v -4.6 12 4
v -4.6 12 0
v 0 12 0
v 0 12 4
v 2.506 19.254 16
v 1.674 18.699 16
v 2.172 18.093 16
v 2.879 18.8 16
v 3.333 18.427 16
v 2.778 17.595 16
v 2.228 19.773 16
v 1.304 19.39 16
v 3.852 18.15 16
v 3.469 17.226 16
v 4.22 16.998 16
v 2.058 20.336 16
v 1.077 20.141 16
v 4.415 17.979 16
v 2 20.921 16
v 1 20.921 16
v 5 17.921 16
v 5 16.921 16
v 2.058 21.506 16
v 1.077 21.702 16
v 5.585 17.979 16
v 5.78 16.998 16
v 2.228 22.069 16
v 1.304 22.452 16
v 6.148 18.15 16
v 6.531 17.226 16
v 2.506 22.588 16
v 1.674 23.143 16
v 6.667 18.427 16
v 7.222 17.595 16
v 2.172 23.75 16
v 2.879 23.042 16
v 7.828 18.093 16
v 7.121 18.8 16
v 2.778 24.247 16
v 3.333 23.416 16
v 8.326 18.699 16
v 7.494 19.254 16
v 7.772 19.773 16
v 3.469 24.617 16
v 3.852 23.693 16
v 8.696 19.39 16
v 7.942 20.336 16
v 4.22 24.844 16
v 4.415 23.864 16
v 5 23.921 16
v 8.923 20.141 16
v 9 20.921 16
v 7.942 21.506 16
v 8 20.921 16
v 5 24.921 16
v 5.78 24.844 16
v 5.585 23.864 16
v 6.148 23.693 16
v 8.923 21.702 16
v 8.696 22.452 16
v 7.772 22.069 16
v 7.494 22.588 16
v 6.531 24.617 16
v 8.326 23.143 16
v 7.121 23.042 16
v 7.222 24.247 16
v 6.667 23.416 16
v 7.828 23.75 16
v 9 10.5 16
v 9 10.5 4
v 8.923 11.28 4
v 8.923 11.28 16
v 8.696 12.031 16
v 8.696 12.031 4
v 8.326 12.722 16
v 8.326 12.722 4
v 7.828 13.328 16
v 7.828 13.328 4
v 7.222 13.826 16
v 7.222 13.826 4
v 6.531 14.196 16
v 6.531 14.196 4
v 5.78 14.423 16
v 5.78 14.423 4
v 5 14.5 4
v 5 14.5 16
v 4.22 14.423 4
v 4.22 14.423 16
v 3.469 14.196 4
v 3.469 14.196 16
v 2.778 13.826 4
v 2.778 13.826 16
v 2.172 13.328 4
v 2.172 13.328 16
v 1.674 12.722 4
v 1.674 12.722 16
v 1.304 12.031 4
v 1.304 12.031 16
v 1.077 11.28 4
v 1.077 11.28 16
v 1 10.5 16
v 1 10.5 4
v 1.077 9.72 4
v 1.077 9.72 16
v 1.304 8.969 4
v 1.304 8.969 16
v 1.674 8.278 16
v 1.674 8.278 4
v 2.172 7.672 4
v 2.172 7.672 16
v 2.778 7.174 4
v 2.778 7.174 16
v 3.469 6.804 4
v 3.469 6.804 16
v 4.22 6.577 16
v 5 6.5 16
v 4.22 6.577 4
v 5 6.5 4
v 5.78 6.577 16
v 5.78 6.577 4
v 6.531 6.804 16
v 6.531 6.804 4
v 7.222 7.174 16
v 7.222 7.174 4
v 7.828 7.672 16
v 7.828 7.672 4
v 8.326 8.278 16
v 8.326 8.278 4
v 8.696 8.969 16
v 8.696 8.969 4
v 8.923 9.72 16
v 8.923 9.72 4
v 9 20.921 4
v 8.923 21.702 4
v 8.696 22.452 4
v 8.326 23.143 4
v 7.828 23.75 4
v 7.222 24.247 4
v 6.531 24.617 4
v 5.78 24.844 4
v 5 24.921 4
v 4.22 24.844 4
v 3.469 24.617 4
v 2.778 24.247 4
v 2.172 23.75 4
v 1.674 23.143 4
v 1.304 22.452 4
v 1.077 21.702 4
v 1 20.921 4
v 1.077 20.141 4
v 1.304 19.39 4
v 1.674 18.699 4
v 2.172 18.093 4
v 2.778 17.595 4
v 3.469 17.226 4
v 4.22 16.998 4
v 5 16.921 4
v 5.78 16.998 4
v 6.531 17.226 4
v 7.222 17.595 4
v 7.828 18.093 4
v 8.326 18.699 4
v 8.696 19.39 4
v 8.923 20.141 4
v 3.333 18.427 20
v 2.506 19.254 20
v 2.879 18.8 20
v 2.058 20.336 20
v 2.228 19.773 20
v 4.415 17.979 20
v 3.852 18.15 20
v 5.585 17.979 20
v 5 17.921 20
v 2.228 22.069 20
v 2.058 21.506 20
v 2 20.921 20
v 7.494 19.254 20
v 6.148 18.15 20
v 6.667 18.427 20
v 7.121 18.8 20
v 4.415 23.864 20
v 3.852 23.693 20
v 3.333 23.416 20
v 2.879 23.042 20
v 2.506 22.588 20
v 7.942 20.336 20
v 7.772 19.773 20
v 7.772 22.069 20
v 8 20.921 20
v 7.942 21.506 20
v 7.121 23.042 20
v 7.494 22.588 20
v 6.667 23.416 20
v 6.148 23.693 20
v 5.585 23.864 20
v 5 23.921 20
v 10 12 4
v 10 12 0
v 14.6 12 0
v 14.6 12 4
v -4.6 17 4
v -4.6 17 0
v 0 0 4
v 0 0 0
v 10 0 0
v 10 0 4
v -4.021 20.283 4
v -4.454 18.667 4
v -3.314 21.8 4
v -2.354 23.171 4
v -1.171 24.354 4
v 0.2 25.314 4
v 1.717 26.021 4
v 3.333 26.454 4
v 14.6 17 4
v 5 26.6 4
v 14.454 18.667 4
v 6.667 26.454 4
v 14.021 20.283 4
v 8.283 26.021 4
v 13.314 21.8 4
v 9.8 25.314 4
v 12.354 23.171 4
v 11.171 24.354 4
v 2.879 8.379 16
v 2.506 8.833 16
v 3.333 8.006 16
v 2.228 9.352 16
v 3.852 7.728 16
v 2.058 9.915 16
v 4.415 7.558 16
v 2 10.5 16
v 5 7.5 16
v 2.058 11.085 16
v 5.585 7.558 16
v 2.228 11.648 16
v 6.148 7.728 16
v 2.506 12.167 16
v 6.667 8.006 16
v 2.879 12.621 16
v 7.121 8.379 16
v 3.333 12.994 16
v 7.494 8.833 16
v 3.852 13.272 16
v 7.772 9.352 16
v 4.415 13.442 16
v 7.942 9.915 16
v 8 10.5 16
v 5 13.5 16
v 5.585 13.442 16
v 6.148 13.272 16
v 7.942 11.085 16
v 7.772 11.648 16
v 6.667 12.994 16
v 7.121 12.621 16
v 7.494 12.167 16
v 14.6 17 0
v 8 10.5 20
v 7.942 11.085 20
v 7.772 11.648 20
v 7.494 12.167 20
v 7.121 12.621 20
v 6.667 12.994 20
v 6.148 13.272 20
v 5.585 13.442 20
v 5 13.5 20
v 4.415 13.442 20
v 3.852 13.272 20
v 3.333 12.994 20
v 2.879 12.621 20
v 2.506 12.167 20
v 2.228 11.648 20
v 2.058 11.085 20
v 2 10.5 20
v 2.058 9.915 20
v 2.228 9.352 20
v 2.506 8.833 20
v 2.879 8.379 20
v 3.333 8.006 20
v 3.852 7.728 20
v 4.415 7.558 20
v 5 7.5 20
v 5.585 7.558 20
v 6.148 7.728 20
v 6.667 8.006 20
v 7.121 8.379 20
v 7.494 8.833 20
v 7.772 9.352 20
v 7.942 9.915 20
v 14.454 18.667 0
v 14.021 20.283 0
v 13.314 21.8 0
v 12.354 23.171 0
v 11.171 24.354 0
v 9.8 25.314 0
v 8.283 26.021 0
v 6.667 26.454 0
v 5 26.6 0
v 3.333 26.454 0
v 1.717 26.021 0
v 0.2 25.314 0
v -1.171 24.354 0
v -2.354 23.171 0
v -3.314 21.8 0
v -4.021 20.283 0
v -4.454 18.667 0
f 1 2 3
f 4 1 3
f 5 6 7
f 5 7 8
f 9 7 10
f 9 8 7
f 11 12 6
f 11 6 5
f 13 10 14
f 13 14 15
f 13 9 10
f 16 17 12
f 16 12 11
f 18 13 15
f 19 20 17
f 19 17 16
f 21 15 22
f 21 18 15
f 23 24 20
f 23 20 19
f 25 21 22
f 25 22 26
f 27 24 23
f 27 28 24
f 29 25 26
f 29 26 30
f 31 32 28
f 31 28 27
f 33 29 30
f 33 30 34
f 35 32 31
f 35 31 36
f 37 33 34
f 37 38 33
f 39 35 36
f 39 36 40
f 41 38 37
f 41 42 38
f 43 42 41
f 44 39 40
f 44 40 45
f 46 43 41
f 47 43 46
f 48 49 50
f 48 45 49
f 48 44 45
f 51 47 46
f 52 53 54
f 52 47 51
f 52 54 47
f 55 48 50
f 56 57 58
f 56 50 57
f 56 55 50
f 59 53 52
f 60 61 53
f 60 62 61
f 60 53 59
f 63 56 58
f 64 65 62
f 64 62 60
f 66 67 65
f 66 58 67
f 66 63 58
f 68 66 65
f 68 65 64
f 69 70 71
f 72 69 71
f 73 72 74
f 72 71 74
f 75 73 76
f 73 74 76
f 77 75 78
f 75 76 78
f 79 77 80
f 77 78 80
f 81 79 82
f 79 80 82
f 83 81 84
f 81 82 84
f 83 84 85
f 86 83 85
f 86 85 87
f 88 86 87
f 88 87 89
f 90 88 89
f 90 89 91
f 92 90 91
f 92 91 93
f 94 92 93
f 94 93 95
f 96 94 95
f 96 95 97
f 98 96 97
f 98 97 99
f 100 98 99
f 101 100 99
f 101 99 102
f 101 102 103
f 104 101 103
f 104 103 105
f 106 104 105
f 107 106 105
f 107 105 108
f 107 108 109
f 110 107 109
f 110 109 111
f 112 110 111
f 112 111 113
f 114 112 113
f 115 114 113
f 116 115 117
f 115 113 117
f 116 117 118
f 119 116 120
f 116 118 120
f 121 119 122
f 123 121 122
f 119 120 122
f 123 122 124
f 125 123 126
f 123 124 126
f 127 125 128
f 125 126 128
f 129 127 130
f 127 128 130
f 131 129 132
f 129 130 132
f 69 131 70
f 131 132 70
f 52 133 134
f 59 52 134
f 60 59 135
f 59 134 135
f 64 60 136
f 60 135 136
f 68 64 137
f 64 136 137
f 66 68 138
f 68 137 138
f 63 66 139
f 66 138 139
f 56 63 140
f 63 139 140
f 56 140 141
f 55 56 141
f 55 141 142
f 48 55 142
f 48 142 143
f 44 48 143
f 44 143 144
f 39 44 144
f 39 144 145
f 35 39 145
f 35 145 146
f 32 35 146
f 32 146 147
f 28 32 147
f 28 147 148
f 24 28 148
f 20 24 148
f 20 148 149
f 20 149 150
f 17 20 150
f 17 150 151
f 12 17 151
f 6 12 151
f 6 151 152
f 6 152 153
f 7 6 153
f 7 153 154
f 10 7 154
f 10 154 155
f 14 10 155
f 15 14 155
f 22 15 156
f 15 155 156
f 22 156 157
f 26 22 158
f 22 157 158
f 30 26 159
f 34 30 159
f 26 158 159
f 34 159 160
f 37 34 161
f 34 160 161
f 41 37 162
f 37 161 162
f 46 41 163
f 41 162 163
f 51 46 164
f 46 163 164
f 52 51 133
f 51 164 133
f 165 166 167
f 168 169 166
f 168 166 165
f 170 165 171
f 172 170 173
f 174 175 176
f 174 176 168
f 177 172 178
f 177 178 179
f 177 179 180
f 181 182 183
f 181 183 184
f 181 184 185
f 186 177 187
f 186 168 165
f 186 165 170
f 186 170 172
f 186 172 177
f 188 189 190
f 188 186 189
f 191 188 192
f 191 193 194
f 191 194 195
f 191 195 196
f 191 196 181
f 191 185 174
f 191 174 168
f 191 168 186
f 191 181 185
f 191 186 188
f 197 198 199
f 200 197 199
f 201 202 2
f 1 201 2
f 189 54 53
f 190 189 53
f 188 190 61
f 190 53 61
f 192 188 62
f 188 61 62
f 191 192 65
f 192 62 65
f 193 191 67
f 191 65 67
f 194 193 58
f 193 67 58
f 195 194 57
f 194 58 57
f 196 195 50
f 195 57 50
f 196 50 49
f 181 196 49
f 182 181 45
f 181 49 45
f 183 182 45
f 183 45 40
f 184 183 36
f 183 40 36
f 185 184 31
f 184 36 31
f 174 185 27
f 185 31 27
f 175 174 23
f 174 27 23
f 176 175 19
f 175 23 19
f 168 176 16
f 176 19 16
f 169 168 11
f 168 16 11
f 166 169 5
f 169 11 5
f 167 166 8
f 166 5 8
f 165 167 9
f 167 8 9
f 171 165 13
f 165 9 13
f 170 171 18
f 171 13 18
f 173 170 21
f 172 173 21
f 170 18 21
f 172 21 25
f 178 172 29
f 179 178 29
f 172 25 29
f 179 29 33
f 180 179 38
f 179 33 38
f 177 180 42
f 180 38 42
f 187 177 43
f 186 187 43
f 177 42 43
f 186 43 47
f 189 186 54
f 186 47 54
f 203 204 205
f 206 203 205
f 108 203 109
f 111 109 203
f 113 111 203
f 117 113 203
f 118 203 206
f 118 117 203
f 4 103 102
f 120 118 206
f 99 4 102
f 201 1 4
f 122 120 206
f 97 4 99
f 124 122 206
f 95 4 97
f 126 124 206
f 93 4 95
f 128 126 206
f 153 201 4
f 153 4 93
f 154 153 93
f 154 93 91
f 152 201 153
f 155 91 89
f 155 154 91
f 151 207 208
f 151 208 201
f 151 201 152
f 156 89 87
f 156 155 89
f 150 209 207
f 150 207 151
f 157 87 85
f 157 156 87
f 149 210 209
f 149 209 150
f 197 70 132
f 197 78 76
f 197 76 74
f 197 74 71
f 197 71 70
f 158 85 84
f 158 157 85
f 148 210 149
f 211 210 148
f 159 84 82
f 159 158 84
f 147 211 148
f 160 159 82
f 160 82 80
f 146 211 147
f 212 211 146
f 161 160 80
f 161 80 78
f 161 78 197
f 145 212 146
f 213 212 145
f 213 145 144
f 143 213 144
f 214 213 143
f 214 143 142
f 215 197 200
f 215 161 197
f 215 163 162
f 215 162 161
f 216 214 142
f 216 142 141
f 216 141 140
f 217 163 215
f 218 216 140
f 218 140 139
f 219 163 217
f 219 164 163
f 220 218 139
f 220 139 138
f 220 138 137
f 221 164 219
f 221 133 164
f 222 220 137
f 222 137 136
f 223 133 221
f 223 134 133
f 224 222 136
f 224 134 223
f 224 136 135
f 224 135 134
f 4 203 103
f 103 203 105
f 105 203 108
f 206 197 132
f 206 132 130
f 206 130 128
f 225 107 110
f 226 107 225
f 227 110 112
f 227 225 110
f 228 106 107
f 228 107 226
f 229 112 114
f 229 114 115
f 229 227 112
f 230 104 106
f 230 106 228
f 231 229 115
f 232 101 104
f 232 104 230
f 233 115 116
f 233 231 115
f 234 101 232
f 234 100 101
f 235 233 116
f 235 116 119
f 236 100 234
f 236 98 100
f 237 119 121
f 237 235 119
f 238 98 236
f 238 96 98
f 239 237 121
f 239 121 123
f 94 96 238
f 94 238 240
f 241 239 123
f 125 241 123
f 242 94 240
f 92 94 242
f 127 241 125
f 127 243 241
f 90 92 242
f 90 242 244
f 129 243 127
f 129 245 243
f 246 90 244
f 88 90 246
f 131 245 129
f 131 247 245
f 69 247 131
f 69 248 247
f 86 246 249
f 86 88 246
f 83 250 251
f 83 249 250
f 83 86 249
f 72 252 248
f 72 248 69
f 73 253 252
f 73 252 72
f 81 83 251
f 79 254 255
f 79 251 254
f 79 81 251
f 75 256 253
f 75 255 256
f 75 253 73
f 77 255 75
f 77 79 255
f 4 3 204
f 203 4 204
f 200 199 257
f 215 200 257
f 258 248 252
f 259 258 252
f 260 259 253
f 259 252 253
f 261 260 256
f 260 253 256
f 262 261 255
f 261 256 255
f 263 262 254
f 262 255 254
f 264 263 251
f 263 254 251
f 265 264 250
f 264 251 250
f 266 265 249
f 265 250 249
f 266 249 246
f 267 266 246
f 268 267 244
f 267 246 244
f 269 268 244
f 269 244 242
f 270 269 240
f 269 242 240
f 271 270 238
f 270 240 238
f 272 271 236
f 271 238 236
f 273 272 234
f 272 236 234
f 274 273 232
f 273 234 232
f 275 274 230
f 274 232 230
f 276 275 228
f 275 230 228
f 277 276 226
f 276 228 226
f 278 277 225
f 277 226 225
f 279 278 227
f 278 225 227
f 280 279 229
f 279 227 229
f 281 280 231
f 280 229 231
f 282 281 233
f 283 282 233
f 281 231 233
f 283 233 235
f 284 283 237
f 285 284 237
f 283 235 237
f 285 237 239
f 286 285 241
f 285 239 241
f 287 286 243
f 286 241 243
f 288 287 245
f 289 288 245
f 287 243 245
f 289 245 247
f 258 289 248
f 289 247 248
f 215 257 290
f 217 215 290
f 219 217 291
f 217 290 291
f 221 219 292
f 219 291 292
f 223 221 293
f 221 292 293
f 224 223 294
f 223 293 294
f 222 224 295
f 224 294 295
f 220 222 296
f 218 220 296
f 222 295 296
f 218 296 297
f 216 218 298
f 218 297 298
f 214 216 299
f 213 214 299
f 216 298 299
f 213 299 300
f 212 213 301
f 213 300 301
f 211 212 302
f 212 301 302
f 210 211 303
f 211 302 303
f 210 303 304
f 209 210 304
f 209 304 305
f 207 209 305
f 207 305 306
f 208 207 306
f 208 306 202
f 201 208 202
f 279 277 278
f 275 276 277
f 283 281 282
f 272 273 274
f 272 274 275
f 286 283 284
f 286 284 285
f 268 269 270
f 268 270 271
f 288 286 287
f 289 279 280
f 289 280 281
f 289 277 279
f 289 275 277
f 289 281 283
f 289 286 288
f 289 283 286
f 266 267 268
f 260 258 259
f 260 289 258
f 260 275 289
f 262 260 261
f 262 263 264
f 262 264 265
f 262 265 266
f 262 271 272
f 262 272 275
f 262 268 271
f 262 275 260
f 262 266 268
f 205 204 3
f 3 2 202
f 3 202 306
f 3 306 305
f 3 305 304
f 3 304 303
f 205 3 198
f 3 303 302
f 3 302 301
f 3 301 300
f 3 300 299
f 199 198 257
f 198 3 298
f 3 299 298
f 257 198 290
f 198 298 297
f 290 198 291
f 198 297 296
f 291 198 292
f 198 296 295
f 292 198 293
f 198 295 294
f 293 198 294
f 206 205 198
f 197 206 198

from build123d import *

# Parameters (mm, degrees)
BOSS_EXTRUDE1_DEPTH = 4
SKETCH2_W           = 2.5
SKETCH2_H           = 4
CUT_EXTRUDE1_DEPTH  = 4
SKETCH4_R           = 4
BOSS_EXTRUDE2_DEPTH = 16
SKETCH5_R           = 3
BOSS_EXTRUDE3_DEPTH = 4


with BuildPart() as part:
    # Sketch1 → Boss-Extrude1 (new body)
    with BuildSketch(Plane.XY):
        with BuildLine():
            Line((0, 0), (10, 0))
            Line((10, 0), (10, 4))
            Line((10, 4), (12.5, 4))
            Line((12.5, 4), (12.5, 8))
            Line((12.5, 8), (10, 8))
            Line((10, 8), (10, 12))
            Line((10, 12), (14.6, 12))
            Line((14.6, 12), (14.6, 17))
            ThreePointArc((14.6, 17), (5, 26.6), (-4.6, 17))
            Line((-4.6, 17), (-4.6, 12))
            Line((-4.6, 12), (0, 12))
            Line((0, 12), (0, 8))
            Line((0, 8), (-2.5, 8))
            Line((-2.5, 8), (-2.5, 4))
            Line((-2.5, 4), (0, 4))
            Line((0, 4), (0, 0))
        make_face()
    extrude(amount=BOSS_EXTRUDE1_DEPTH)

    # Sketch2 → Cut-Extrude1 (cut)
    with BuildSketch(Plane.XY.offset(4)):
        with Locations((-1.25, 6)):
            Rectangle(SKETCH2_W, SKETCH2_H)
        with Locations((11.25, 6)):
            Rectangle(SKETCH2_W, SKETCH2_H)
    extrude(amount=-CUT_EXTRUDE1_DEPTH, mode=Mode.SUBTRACT)

    # Sketch4 → Boss-Extrude2 (add)
    with BuildSketch(Plane.XY):
        with Locations((5, 20.921172359)):
            Circle(SKETCH4_R)
        with Locations((5, 10.5)):
            Circle(SKETCH4_R)
    extrude(amount=BOSS_EXTRUDE2_DEPTH)

    # Sketch5 → Boss-Extrude3 (add)
    with BuildSketch(Plane.XY.offset(16)):
        with Locations((5, 10.5)):
            Circle(SKETCH5_R)
        with Locations((5, 20.921172359)):
            Circle(SKETCH5_R)
    extrude(amount=BOSS_EXTRUDE3_DEPTH)


solid = part.part
